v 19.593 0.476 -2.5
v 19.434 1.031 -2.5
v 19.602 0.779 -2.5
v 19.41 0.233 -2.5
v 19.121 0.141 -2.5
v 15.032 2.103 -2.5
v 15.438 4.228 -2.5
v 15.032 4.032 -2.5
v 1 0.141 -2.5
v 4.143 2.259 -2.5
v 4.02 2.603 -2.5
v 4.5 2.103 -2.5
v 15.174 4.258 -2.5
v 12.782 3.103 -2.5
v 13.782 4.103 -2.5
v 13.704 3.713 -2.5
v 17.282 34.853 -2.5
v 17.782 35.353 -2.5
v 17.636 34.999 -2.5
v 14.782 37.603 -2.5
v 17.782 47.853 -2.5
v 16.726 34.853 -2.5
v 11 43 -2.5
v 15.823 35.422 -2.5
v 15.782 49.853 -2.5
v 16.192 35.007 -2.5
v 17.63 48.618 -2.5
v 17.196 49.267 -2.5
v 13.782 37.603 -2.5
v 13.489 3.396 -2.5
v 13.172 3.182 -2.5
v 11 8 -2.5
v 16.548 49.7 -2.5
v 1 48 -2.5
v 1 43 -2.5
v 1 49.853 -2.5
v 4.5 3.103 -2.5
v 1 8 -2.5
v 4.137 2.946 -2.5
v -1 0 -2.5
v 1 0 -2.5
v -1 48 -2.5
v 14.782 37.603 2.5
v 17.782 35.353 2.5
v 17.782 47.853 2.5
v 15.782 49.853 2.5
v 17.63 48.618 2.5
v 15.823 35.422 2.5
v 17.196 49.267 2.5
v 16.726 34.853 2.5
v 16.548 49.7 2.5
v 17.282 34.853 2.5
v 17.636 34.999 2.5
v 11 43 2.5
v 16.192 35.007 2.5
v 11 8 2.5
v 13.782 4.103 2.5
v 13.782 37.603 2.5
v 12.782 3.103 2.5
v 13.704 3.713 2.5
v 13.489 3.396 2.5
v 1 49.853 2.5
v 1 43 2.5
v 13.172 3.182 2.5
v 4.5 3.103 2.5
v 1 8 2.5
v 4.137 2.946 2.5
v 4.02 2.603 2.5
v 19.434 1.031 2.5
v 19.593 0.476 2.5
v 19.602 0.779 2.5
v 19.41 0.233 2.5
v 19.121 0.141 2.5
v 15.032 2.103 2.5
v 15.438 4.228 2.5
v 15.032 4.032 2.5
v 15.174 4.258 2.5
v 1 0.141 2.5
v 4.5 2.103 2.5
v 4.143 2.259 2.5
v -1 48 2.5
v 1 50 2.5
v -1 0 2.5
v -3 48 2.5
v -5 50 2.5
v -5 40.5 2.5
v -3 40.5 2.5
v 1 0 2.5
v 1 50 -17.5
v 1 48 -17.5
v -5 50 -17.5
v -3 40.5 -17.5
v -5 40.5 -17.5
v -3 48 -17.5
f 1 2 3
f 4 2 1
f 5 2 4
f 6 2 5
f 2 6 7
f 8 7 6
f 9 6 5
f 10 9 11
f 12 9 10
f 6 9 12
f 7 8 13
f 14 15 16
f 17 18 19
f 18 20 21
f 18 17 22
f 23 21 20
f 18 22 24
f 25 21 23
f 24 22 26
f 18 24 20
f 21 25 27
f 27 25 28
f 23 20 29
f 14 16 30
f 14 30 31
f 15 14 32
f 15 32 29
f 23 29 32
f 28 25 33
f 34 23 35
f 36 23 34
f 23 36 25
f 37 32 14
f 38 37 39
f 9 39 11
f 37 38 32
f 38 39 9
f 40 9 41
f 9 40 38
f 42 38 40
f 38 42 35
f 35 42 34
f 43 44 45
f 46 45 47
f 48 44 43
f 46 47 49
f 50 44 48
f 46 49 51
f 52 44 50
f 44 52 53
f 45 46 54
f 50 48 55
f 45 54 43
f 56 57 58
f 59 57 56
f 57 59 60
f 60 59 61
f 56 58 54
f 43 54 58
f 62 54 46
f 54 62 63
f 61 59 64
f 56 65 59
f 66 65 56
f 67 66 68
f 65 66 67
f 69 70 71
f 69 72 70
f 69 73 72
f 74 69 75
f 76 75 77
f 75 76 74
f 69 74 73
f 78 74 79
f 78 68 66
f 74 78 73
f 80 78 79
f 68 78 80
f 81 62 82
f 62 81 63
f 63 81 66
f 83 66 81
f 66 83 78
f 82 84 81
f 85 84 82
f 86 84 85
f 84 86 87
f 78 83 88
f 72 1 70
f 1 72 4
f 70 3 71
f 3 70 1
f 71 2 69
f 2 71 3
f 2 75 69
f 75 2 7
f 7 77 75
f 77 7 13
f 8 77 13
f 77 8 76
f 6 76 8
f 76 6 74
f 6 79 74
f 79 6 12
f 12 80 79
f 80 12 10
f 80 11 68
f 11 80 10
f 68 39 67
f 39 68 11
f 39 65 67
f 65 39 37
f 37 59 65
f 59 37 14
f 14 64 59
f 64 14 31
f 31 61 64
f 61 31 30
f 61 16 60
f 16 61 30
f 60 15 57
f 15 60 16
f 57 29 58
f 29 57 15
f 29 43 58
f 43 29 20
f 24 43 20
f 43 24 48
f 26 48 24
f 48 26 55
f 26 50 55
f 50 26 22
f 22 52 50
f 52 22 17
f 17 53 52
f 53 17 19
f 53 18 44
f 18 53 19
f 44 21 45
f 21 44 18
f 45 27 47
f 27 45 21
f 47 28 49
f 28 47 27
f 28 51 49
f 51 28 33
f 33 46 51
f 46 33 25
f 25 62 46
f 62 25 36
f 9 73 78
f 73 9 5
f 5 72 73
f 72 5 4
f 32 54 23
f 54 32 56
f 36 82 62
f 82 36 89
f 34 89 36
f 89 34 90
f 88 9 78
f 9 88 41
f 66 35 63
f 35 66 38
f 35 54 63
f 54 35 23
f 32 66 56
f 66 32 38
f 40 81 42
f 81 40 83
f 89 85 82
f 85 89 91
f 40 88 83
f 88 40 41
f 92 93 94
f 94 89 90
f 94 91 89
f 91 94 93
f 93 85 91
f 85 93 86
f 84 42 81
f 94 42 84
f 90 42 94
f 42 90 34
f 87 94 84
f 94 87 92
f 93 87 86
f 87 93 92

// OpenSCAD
CLIP_H = 5;
HOLE_DEPTH = 9;
HOLE_DIAMETER = 2.1;
HEIGHT = 2;
EMPTYLength = 35;
EMPTYWidth = 10;

module din_clip() {
	
    union() {
        difference() {
            linear_extrude(height=CLIP_H, center=true, convexity=5) {
                import(file="din_clip_01.dxf", layer="0", $fn=64);
            }
            
            translate([6, (EMPTYLength / 2) + 8 , 0]) {
                cube([ EMPTYWidth,  EMPTYLength, CLIP_H], center = true);
            }
        }
        
        translate([0, 25, 0]) {
            difference() {
                union() {
                    cube([HEIGHT, 50, CLIP_H], center = true);
                    
                    translate([-HEIGHT, 24, -7.5]) cube([HEIGHT + 4, 2, CLIP_H + 15], center = true);
                    translate([-HEIGHT - 2, 18, -7.5]) cube([HEIGHT, 5, CLIP_H + 15], center = true);                    
                    translate([-HEIGHT - 2, 22, -7.5]) cube([HEIGHT, 5, CLIP_H + 15], center = true);
                }
                /*union() {

                    translate([-HEIGHT, 38, 0]) {
                        rotate([0, 90, 0]) {
                            cylinder(h= HOLE_DEPTH, r = HOLE_DIAMETER / 2, $fn = 16);
                        }
                    }

                    translate([-HEIGHT, -38, 0]) {
                        rotate([0, 90, 0]) {
                            cylinder(h= HOLE_DEPTH, r = HOLE_DIAMETER / 2, $fn = 16);
                        }
                    }
                }*/
            }
        }
    }
}

din_clip();
